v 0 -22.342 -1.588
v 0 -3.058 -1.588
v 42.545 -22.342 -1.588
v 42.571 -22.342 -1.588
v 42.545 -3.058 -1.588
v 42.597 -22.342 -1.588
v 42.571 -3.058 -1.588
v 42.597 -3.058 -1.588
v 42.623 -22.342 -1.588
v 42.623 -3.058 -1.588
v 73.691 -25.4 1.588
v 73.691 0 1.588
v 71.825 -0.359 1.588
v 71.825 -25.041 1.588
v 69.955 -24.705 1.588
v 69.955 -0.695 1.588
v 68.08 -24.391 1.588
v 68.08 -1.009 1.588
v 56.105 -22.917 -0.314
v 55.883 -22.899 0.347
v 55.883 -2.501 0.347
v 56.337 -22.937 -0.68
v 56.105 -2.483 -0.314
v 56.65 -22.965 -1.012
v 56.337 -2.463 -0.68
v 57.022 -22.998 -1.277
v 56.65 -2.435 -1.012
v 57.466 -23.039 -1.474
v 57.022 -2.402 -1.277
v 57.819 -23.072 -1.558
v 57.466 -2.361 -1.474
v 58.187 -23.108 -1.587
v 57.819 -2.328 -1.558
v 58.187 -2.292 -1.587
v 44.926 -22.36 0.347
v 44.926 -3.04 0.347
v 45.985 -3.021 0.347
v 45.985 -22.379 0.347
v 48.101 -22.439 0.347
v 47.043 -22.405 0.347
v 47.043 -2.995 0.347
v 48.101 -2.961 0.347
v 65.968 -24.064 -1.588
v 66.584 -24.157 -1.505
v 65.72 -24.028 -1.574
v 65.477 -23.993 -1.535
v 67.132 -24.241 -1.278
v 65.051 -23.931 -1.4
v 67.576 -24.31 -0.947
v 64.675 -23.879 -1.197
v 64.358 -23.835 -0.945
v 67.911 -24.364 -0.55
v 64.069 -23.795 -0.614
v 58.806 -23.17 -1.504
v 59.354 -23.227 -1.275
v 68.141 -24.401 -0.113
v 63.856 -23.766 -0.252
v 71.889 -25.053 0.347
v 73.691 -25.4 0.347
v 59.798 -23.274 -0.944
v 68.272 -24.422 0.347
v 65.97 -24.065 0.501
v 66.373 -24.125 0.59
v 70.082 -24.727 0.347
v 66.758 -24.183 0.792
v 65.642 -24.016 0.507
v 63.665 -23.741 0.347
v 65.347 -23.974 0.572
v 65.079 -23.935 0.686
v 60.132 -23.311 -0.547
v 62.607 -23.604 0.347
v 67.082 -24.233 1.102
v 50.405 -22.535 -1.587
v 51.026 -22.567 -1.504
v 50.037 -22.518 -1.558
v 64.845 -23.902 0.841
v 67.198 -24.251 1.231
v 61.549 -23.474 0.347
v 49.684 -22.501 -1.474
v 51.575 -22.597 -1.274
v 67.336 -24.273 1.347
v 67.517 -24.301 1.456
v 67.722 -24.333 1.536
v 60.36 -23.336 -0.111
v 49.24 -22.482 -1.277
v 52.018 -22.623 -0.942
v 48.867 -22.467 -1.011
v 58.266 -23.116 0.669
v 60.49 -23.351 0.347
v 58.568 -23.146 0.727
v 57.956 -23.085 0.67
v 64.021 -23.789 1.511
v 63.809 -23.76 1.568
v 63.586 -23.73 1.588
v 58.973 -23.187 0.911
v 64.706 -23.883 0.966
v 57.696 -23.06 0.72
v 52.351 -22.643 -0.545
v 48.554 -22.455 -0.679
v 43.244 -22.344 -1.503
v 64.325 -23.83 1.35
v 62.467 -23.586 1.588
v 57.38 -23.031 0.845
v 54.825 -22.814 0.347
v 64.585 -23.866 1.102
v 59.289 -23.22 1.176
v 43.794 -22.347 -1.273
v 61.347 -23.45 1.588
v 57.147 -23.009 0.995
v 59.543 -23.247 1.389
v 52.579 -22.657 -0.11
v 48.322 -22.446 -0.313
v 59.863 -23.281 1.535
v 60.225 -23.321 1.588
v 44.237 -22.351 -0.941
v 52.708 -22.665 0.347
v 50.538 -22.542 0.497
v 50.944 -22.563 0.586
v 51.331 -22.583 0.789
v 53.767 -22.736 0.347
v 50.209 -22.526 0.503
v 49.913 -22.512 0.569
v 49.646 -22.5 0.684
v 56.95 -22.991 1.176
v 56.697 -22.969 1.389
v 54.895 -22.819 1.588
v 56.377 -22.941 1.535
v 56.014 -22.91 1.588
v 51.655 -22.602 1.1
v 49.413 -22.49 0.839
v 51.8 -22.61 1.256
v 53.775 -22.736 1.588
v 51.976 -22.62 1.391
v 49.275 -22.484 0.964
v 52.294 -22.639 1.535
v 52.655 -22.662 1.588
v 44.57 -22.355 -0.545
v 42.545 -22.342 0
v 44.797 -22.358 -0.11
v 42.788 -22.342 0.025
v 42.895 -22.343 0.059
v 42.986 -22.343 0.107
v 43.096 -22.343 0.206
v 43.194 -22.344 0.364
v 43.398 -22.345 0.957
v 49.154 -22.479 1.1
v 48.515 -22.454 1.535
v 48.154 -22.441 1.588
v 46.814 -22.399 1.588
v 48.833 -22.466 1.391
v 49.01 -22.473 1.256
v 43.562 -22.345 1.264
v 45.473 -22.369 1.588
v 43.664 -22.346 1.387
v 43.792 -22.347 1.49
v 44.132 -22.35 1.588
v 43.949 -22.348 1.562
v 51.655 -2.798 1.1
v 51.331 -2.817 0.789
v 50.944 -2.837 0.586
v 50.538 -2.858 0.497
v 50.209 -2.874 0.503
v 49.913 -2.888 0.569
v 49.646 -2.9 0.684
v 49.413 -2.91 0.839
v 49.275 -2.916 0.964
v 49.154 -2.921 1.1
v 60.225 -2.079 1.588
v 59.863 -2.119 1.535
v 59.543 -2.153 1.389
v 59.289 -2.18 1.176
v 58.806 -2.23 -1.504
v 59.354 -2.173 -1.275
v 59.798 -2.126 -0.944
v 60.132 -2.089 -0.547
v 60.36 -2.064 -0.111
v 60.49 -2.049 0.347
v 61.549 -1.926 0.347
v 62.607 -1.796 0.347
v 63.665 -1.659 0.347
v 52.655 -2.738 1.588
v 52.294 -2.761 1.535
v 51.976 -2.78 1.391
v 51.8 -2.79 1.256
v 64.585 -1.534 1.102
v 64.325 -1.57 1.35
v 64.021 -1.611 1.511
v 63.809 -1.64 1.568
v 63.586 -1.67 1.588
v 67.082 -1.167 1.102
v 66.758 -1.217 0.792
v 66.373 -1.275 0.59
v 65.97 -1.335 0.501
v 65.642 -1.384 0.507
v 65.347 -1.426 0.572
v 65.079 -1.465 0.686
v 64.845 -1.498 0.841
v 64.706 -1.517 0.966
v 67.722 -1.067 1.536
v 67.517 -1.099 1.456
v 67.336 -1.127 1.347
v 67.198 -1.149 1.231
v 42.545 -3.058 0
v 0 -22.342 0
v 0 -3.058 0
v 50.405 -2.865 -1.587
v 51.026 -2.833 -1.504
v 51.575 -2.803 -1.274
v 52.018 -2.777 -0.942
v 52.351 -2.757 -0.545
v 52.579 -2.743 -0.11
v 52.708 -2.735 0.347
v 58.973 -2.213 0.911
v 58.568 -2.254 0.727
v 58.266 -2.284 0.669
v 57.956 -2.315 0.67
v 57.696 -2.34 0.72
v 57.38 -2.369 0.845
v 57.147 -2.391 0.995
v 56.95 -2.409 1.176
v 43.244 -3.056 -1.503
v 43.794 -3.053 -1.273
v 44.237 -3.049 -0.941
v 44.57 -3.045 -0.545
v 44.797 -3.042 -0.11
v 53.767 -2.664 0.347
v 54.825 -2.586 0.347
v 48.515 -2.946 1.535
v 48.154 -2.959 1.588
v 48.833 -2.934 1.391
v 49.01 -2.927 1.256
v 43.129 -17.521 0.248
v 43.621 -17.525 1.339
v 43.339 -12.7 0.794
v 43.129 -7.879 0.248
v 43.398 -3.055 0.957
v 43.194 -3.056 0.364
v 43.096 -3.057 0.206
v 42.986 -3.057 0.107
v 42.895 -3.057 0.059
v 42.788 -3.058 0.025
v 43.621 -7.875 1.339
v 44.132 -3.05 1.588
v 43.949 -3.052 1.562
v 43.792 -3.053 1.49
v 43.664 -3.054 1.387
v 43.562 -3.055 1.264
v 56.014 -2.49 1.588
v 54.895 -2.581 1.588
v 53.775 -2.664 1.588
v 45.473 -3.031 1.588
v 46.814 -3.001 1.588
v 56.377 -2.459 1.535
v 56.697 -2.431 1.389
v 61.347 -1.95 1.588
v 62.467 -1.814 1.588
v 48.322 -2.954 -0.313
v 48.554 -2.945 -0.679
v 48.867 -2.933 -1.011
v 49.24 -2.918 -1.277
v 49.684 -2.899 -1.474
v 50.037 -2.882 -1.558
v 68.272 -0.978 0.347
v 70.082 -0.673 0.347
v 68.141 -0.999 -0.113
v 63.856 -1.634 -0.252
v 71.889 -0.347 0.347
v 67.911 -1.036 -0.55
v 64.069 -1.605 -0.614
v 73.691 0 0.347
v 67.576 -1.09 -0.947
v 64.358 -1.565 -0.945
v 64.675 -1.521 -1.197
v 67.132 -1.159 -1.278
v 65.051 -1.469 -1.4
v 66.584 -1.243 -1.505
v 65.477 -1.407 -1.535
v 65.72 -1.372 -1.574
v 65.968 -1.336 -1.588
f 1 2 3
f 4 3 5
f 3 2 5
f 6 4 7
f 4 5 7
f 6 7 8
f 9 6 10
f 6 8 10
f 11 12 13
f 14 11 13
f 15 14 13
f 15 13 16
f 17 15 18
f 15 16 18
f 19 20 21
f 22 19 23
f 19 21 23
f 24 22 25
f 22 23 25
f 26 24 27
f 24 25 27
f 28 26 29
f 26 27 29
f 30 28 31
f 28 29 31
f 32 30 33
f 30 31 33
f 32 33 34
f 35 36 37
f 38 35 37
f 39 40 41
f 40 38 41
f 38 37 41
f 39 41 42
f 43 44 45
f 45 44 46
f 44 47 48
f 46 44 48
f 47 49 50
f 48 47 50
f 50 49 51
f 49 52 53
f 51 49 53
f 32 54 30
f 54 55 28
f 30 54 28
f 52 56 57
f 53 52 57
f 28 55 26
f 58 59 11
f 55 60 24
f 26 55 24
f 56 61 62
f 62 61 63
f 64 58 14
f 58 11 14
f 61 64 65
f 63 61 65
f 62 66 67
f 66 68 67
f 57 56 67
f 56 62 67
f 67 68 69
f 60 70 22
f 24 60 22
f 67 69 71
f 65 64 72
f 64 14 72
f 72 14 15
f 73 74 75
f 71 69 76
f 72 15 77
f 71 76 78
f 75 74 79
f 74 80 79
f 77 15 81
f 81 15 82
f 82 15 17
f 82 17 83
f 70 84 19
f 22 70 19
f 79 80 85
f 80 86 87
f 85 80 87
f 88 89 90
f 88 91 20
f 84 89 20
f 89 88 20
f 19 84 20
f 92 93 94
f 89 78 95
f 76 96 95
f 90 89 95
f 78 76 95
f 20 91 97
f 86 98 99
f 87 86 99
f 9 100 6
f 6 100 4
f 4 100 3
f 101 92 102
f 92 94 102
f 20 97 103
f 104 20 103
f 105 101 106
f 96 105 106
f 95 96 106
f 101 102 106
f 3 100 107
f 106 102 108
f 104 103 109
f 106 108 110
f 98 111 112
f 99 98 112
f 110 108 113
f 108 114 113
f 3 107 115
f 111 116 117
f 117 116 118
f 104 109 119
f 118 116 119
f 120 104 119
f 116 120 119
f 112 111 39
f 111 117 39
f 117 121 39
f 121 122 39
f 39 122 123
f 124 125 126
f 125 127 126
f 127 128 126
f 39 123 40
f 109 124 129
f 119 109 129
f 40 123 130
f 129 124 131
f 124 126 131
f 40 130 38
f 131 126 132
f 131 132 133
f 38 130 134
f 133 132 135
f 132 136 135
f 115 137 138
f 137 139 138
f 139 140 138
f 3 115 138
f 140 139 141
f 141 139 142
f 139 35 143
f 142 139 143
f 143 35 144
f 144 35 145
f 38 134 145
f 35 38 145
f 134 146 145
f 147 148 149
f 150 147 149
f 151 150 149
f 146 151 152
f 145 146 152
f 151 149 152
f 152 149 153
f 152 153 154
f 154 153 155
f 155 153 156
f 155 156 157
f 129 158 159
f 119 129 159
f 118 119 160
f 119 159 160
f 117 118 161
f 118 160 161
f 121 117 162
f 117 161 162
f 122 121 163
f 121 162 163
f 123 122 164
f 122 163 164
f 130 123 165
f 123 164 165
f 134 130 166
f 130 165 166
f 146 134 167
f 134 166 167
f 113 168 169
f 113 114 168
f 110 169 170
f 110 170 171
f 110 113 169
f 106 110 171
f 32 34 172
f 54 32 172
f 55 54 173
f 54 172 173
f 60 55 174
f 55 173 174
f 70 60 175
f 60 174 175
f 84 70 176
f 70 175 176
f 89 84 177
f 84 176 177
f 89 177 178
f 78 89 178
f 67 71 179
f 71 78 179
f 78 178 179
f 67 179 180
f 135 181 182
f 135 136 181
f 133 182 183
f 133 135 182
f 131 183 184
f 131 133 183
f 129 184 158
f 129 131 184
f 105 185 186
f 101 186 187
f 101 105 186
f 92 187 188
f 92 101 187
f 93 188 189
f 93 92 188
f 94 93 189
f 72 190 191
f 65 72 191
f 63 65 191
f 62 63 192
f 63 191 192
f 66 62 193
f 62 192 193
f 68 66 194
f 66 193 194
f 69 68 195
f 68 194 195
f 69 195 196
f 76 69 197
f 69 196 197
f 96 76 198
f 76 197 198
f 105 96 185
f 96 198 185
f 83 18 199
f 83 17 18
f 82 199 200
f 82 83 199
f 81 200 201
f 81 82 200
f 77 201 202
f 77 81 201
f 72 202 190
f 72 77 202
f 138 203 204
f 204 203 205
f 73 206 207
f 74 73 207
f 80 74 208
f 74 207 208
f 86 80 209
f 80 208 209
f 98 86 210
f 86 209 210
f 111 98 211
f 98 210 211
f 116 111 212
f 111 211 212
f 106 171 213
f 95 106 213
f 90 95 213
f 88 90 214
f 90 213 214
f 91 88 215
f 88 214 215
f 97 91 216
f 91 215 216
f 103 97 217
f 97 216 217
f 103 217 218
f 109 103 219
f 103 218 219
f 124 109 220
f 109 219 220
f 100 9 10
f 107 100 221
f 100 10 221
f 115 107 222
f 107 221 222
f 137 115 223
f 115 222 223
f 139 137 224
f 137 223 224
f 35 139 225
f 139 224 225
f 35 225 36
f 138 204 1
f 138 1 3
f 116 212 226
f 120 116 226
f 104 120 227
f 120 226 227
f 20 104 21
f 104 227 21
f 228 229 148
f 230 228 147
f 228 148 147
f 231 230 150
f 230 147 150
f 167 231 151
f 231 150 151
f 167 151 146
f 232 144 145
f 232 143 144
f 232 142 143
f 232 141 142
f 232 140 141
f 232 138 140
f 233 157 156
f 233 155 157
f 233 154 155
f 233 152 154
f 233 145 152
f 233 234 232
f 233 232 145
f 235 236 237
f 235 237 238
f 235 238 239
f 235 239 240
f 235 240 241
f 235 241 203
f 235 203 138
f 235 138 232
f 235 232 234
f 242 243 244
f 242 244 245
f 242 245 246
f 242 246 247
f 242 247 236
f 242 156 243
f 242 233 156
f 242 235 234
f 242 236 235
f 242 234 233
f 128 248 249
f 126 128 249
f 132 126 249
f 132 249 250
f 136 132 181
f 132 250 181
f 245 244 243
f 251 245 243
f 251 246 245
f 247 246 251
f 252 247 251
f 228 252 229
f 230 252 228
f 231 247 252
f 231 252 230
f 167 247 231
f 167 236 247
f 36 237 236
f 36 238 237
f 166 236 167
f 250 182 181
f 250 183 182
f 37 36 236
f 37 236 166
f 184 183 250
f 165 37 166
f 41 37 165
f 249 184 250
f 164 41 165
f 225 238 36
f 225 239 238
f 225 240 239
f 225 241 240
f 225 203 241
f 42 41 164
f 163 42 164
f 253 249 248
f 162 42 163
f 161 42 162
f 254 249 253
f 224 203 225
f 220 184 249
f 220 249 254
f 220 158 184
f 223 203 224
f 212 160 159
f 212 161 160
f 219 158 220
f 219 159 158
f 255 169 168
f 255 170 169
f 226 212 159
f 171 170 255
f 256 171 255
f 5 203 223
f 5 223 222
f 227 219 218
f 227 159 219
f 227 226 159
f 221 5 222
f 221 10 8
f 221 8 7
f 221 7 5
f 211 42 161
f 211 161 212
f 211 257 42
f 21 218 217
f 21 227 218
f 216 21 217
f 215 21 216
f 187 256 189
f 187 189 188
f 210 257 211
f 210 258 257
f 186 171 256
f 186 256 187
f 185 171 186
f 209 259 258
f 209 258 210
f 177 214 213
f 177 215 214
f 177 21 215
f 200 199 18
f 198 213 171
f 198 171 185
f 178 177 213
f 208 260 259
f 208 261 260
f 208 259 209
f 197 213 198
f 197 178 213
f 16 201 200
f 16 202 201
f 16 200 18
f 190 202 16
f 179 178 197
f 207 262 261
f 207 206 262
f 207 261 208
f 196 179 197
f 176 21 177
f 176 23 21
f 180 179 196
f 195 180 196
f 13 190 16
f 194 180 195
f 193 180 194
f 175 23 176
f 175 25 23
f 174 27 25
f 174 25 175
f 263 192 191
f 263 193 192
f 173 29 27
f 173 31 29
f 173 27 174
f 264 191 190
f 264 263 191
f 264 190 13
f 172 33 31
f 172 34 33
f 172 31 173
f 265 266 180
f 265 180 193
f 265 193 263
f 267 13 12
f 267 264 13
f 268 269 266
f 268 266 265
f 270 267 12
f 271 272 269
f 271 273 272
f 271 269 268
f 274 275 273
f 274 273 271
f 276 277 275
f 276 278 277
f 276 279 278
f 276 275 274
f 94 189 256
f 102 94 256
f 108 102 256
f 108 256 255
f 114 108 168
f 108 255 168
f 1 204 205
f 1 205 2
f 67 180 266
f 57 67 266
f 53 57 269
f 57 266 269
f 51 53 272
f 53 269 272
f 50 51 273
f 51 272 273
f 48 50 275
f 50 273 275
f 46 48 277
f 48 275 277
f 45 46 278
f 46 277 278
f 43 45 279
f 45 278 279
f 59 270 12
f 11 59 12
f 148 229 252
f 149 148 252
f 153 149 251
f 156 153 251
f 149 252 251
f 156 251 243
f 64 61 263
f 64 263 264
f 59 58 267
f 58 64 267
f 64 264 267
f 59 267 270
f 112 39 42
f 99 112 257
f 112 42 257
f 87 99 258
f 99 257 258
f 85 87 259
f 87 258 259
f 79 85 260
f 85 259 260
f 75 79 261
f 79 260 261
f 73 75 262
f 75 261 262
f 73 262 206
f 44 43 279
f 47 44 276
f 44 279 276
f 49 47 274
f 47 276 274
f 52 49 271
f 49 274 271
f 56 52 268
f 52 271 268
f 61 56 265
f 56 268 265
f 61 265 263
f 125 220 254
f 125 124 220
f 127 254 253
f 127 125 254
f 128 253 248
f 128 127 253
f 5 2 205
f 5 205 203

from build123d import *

# Parameters (mm, degrees)
F1_DEPTH = 25.4
F2_W     = 42.545
F2_H     = 3.057748
F3_DEPTH = 12.7
F4_R     = 1.27


with BuildPart() as f1:
    # F0 (on Front) → F1 (new body)
    with BuildSketch(Plane.XZ):
        with BuildLine():
            Line((42.545, 0), (0, 0))
            Line((0, 0), (0, -1.5875))
            Line((0, -1.5875), (42.622831, -1.5875))
            ThreePointArc((42.622831, -1.5875), (44.12669, -1.039864), (44.92625, 0.346572))
            Line((44.92625, 0.346572), (48.10125, 0.346572))
            ThreePointArc((48.10125, 0.346572), (48.90081, -1.039864), (50.404669, -1.5875))
            ThreePointArc((50.404669, -1.5875), (51.908529, -1.039864), (52.708089, 0.346572))
            Line((52.708089, 0.346572), (55.883089, 0.346572))
            ThreePointArc((55.883089, 0.346572), (56.682648, -1.039864), (58.186508, -1.5875))
            ThreePointArc((58.186508, -1.5875), (59.690368, -1.039864), (60.489927, 0.346572))
            Line((60.489927, 0.346572), (63.664927, 0.346572))
            ThreePointArc((63.664927, 0.346572), (64.464487, -1.039864), (65.968346, -1.5875))
            ThreePointArc((65.968346, -1.5875), (67.472206, -1.039864), (68.271766, 0.346572))
            Line((68.271766, 0.346572), (73.691467, 0.346572))
            Line((73.691467, 0.346572), (73.691467, 1.5875))
            Line((73.691467, 1.5875), (67.341467, 1.5875))
            ThreePointArc((67.341467, 1.5875), (65.833294, 0.495549), (64.32512, 1.5875))
            Line((64.32512, 1.5875), (59.56262, 1.5875))
            ThreePointArc((59.56262, 1.5875), (58.119729, 0.661984), (56.676839, 1.5875))
            Line((56.676839, 1.5875), (51.914339, 1.5875))
            ThreePointArc((51.914339, 1.5875), (50.404669, 0.490973), (48.895, 1.5875))
            Line((48.895, 1.5875), (44.1325, 1.5875))
            add(Edge.make_bspline(
                [(42.545, 0), (43.173972, 0), (43.24261, 0.79375), (43.695807, 1.5875), (44.1325, 1.5875)],
                knots=[0, 0, 0, 0, 1.122532, 2.245064, 2.245064, 2.245064, 2.245064], degree=3))
        make_face()
    extrude(amount=F1_DEPTH)

    # F2 (on face) → F3 (cut, symmetric)
    with BuildSketch(Plane.XY):
        with Locations((21.2725, -1.528874)):
            Rectangle(F2_W, F2_H)
        with BuildLine():
            Line((42.545, 0), (42.545, -3.057748))
            ThreePointArc((42.545, -3.057748), (58.193101, -2.291478), (73.691467, 0))
            Line((73.691467, 0), (42.545, 0))
        make_face()
        with Locations((21.2725, -23.871126)):
            Rectangle(F2_W, F2_H)
        with BuildLine():
            ThreePointArc((73.691467, -25.4), (58.193101, -23.108522), (42.545, -22.342252))
            Line((42.545, -22.342252), (42.545, -25.4))
            Line((42.545, -25.4), (73.691467, -25.4))
        make_face()
    extrude(amount=F3_DEPTH, both=True, mode=Mode.SUBTRACT)

    # F4
    f4_edges = [f1.edges().sort_by_distance(p)[0] for p in [
        (48.895, -12.7, 1.5875),
        (44.1325, -12.7, 1.5875),
        (51.914339, -12.7, 1.5875),
        (56.676839, -12.7, 1.5875),
        (59.56262, -12.7, 1.5875),
        (64.32512, -12.7, 1.5875),
        (67.341467, -12.7, 1.5875),
    ]]
    fillet(f4_edges, radius=F4_R)


solid = f1.part
